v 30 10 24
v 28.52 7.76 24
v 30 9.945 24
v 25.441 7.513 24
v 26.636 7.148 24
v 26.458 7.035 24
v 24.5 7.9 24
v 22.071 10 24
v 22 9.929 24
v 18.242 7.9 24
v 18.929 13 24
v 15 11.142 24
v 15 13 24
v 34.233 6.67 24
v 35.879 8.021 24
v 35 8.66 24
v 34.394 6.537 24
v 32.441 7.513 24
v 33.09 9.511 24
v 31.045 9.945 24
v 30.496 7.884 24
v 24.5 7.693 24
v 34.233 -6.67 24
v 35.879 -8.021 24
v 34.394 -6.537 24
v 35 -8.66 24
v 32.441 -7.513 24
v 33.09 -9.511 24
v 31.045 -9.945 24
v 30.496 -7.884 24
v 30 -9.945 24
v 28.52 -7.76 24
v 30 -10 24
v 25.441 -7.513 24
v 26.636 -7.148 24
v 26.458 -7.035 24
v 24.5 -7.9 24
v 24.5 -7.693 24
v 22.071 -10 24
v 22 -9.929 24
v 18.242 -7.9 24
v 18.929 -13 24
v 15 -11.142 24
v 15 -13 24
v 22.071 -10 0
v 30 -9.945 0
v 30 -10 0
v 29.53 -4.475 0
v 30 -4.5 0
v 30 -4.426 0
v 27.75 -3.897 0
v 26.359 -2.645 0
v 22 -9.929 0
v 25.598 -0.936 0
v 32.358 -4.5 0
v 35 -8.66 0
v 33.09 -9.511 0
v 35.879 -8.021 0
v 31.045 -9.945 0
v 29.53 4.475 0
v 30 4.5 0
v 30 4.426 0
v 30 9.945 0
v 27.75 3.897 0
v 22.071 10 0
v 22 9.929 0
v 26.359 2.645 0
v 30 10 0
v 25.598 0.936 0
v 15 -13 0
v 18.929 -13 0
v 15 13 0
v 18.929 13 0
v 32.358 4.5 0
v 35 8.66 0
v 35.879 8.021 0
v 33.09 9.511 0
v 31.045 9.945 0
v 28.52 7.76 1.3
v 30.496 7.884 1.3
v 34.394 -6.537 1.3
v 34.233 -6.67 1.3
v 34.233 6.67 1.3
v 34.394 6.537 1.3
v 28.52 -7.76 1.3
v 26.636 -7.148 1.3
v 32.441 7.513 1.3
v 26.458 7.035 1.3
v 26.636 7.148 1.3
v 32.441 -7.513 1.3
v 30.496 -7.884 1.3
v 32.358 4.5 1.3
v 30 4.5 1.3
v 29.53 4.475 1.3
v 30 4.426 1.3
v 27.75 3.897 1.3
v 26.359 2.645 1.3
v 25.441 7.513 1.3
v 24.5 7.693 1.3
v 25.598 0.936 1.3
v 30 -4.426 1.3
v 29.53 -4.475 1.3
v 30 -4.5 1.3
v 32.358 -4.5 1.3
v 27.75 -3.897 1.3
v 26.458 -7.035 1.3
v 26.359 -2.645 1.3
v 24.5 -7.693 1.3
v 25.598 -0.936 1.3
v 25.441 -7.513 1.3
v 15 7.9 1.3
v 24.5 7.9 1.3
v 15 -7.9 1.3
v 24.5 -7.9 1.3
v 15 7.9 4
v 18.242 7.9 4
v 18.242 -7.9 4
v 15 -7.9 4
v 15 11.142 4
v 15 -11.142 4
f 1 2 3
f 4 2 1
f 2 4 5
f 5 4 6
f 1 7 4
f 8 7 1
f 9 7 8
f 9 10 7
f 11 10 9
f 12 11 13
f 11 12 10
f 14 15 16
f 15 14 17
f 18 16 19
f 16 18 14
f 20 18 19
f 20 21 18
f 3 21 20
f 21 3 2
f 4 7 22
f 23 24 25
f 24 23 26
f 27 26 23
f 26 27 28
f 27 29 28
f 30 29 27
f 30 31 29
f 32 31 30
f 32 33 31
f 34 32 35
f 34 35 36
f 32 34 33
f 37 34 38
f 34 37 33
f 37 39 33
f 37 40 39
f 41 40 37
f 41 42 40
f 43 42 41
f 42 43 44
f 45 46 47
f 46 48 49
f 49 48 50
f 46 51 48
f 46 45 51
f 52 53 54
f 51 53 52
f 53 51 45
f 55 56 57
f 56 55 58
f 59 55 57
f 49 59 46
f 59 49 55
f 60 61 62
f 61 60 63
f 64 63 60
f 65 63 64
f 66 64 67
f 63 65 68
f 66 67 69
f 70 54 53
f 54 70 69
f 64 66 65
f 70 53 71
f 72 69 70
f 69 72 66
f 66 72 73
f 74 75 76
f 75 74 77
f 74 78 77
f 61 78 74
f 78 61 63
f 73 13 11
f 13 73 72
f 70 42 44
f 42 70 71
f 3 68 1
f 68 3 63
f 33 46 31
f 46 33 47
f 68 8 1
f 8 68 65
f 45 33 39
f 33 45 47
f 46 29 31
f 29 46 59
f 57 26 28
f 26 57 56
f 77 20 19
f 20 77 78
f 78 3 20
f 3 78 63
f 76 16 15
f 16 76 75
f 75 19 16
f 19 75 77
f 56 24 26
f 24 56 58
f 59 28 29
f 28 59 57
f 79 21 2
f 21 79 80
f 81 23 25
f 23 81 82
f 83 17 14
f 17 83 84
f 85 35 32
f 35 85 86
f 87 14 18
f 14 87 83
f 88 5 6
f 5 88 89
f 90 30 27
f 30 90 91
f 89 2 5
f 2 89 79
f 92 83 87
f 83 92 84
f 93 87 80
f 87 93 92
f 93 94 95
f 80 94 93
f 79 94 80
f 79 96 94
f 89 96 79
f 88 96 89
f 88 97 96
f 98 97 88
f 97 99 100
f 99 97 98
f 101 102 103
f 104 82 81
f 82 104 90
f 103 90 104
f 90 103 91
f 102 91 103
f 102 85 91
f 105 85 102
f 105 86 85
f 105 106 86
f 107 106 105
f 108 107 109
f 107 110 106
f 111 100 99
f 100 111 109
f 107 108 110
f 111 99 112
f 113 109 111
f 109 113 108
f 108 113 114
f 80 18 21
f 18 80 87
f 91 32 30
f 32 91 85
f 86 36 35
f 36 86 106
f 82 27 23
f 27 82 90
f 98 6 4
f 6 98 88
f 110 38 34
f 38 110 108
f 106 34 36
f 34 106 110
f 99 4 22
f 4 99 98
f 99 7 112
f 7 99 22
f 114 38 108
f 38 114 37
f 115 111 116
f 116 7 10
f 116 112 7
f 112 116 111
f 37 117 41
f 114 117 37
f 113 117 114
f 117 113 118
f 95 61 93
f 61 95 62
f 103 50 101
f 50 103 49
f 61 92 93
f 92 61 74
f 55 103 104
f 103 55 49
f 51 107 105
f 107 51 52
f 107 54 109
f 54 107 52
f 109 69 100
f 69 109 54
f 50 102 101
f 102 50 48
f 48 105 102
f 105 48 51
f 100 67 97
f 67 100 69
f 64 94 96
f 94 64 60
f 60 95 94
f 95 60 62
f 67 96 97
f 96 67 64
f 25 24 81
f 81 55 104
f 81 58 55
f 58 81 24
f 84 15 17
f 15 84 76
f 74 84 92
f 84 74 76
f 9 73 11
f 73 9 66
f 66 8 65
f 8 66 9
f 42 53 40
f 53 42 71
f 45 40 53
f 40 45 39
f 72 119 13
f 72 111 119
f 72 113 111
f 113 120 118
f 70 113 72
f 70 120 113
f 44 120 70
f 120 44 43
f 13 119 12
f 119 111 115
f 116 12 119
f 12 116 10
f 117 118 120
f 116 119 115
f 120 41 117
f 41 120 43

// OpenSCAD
//translate([5,0,5+8]) %cube([26,26,10], center=true);



translate([30,0,0]) %cylinder(r=15.8/2, h=30);

difference(){
union(){
translate([7,0,12]) cube([30,26,24], center=true);
translate([8.5+2.5,0,12]) cube([38,20,24], center=true);
translate([30,0,0]) cylinder(r=20/2, h=24);
}

// main cutout
//translate([8.5-2,0,4.5]) cube([25,22,8], center=true);

// nozzle full cutout
translate([30,0,1.3]) cylinder(r=15.8/2, h=24);
translate([23,0,1.3]) cylinder(r=15.8/2, h=24);
translate([8.5+2,0,16.3]) cube([28,15.8,30], center=true);

// nozzle center cutout
translate([35,0,4.5]) cube([10,9,30], center=true);
translate([30,0,-0.5]) cylinder(r=9/2, h=25);

//slide in cutout
translate([42,0,9.5]) rotate([0,0,45]) cube([20,20,40], center=true);

// fan screws cutouts
//translate([-5,10,0.5]) cylinder(r=1.5, h=10, $fn=15);
//translate([-5,-10,0.5]) cylinder(r=1.5, h=10, $fn=15);
//translate([15,10,0.5]) cylinder(r=1.5, h=10, $fn=15);
//translate([15,-10,0.5]) cylinder(r=1.5, h=10, $fn=15);

// angled walls

translate([0,0,15]) rotate([0,45,0]) cube([20,14,20], center=true);
translate([5,5,15]) rotate([45,0,0]) cube([14,20,20], center=true);
translate([5,-5,15]) rotate([45,0,0]) cube([14,20,20], center=true);

// pretty fan
//translate([5,0,0.5]) cylinder(r=11.5, h=10, $fn=45);

// smooth edges

translate([22,17,9.5]) rotate([0,0,45]) cube([10,10,30], center=true);
translate([22,-17,9.5]) rotate([0,0,45]) cube([10,10,30], center=true);


translate([-9,-17,9.5]) rotate([0,0,45]) cube([10,10,30], center=true);
translate([-9,17,9.5]) rotate([0,0,45]) cube([10,10,30], center=true);


translate([0,0,4.5]) cube([30,30,40], center=true);

translate([12,0,20+4]) rotate([0,0,45]) cube([20,20,40], center=true);

}
